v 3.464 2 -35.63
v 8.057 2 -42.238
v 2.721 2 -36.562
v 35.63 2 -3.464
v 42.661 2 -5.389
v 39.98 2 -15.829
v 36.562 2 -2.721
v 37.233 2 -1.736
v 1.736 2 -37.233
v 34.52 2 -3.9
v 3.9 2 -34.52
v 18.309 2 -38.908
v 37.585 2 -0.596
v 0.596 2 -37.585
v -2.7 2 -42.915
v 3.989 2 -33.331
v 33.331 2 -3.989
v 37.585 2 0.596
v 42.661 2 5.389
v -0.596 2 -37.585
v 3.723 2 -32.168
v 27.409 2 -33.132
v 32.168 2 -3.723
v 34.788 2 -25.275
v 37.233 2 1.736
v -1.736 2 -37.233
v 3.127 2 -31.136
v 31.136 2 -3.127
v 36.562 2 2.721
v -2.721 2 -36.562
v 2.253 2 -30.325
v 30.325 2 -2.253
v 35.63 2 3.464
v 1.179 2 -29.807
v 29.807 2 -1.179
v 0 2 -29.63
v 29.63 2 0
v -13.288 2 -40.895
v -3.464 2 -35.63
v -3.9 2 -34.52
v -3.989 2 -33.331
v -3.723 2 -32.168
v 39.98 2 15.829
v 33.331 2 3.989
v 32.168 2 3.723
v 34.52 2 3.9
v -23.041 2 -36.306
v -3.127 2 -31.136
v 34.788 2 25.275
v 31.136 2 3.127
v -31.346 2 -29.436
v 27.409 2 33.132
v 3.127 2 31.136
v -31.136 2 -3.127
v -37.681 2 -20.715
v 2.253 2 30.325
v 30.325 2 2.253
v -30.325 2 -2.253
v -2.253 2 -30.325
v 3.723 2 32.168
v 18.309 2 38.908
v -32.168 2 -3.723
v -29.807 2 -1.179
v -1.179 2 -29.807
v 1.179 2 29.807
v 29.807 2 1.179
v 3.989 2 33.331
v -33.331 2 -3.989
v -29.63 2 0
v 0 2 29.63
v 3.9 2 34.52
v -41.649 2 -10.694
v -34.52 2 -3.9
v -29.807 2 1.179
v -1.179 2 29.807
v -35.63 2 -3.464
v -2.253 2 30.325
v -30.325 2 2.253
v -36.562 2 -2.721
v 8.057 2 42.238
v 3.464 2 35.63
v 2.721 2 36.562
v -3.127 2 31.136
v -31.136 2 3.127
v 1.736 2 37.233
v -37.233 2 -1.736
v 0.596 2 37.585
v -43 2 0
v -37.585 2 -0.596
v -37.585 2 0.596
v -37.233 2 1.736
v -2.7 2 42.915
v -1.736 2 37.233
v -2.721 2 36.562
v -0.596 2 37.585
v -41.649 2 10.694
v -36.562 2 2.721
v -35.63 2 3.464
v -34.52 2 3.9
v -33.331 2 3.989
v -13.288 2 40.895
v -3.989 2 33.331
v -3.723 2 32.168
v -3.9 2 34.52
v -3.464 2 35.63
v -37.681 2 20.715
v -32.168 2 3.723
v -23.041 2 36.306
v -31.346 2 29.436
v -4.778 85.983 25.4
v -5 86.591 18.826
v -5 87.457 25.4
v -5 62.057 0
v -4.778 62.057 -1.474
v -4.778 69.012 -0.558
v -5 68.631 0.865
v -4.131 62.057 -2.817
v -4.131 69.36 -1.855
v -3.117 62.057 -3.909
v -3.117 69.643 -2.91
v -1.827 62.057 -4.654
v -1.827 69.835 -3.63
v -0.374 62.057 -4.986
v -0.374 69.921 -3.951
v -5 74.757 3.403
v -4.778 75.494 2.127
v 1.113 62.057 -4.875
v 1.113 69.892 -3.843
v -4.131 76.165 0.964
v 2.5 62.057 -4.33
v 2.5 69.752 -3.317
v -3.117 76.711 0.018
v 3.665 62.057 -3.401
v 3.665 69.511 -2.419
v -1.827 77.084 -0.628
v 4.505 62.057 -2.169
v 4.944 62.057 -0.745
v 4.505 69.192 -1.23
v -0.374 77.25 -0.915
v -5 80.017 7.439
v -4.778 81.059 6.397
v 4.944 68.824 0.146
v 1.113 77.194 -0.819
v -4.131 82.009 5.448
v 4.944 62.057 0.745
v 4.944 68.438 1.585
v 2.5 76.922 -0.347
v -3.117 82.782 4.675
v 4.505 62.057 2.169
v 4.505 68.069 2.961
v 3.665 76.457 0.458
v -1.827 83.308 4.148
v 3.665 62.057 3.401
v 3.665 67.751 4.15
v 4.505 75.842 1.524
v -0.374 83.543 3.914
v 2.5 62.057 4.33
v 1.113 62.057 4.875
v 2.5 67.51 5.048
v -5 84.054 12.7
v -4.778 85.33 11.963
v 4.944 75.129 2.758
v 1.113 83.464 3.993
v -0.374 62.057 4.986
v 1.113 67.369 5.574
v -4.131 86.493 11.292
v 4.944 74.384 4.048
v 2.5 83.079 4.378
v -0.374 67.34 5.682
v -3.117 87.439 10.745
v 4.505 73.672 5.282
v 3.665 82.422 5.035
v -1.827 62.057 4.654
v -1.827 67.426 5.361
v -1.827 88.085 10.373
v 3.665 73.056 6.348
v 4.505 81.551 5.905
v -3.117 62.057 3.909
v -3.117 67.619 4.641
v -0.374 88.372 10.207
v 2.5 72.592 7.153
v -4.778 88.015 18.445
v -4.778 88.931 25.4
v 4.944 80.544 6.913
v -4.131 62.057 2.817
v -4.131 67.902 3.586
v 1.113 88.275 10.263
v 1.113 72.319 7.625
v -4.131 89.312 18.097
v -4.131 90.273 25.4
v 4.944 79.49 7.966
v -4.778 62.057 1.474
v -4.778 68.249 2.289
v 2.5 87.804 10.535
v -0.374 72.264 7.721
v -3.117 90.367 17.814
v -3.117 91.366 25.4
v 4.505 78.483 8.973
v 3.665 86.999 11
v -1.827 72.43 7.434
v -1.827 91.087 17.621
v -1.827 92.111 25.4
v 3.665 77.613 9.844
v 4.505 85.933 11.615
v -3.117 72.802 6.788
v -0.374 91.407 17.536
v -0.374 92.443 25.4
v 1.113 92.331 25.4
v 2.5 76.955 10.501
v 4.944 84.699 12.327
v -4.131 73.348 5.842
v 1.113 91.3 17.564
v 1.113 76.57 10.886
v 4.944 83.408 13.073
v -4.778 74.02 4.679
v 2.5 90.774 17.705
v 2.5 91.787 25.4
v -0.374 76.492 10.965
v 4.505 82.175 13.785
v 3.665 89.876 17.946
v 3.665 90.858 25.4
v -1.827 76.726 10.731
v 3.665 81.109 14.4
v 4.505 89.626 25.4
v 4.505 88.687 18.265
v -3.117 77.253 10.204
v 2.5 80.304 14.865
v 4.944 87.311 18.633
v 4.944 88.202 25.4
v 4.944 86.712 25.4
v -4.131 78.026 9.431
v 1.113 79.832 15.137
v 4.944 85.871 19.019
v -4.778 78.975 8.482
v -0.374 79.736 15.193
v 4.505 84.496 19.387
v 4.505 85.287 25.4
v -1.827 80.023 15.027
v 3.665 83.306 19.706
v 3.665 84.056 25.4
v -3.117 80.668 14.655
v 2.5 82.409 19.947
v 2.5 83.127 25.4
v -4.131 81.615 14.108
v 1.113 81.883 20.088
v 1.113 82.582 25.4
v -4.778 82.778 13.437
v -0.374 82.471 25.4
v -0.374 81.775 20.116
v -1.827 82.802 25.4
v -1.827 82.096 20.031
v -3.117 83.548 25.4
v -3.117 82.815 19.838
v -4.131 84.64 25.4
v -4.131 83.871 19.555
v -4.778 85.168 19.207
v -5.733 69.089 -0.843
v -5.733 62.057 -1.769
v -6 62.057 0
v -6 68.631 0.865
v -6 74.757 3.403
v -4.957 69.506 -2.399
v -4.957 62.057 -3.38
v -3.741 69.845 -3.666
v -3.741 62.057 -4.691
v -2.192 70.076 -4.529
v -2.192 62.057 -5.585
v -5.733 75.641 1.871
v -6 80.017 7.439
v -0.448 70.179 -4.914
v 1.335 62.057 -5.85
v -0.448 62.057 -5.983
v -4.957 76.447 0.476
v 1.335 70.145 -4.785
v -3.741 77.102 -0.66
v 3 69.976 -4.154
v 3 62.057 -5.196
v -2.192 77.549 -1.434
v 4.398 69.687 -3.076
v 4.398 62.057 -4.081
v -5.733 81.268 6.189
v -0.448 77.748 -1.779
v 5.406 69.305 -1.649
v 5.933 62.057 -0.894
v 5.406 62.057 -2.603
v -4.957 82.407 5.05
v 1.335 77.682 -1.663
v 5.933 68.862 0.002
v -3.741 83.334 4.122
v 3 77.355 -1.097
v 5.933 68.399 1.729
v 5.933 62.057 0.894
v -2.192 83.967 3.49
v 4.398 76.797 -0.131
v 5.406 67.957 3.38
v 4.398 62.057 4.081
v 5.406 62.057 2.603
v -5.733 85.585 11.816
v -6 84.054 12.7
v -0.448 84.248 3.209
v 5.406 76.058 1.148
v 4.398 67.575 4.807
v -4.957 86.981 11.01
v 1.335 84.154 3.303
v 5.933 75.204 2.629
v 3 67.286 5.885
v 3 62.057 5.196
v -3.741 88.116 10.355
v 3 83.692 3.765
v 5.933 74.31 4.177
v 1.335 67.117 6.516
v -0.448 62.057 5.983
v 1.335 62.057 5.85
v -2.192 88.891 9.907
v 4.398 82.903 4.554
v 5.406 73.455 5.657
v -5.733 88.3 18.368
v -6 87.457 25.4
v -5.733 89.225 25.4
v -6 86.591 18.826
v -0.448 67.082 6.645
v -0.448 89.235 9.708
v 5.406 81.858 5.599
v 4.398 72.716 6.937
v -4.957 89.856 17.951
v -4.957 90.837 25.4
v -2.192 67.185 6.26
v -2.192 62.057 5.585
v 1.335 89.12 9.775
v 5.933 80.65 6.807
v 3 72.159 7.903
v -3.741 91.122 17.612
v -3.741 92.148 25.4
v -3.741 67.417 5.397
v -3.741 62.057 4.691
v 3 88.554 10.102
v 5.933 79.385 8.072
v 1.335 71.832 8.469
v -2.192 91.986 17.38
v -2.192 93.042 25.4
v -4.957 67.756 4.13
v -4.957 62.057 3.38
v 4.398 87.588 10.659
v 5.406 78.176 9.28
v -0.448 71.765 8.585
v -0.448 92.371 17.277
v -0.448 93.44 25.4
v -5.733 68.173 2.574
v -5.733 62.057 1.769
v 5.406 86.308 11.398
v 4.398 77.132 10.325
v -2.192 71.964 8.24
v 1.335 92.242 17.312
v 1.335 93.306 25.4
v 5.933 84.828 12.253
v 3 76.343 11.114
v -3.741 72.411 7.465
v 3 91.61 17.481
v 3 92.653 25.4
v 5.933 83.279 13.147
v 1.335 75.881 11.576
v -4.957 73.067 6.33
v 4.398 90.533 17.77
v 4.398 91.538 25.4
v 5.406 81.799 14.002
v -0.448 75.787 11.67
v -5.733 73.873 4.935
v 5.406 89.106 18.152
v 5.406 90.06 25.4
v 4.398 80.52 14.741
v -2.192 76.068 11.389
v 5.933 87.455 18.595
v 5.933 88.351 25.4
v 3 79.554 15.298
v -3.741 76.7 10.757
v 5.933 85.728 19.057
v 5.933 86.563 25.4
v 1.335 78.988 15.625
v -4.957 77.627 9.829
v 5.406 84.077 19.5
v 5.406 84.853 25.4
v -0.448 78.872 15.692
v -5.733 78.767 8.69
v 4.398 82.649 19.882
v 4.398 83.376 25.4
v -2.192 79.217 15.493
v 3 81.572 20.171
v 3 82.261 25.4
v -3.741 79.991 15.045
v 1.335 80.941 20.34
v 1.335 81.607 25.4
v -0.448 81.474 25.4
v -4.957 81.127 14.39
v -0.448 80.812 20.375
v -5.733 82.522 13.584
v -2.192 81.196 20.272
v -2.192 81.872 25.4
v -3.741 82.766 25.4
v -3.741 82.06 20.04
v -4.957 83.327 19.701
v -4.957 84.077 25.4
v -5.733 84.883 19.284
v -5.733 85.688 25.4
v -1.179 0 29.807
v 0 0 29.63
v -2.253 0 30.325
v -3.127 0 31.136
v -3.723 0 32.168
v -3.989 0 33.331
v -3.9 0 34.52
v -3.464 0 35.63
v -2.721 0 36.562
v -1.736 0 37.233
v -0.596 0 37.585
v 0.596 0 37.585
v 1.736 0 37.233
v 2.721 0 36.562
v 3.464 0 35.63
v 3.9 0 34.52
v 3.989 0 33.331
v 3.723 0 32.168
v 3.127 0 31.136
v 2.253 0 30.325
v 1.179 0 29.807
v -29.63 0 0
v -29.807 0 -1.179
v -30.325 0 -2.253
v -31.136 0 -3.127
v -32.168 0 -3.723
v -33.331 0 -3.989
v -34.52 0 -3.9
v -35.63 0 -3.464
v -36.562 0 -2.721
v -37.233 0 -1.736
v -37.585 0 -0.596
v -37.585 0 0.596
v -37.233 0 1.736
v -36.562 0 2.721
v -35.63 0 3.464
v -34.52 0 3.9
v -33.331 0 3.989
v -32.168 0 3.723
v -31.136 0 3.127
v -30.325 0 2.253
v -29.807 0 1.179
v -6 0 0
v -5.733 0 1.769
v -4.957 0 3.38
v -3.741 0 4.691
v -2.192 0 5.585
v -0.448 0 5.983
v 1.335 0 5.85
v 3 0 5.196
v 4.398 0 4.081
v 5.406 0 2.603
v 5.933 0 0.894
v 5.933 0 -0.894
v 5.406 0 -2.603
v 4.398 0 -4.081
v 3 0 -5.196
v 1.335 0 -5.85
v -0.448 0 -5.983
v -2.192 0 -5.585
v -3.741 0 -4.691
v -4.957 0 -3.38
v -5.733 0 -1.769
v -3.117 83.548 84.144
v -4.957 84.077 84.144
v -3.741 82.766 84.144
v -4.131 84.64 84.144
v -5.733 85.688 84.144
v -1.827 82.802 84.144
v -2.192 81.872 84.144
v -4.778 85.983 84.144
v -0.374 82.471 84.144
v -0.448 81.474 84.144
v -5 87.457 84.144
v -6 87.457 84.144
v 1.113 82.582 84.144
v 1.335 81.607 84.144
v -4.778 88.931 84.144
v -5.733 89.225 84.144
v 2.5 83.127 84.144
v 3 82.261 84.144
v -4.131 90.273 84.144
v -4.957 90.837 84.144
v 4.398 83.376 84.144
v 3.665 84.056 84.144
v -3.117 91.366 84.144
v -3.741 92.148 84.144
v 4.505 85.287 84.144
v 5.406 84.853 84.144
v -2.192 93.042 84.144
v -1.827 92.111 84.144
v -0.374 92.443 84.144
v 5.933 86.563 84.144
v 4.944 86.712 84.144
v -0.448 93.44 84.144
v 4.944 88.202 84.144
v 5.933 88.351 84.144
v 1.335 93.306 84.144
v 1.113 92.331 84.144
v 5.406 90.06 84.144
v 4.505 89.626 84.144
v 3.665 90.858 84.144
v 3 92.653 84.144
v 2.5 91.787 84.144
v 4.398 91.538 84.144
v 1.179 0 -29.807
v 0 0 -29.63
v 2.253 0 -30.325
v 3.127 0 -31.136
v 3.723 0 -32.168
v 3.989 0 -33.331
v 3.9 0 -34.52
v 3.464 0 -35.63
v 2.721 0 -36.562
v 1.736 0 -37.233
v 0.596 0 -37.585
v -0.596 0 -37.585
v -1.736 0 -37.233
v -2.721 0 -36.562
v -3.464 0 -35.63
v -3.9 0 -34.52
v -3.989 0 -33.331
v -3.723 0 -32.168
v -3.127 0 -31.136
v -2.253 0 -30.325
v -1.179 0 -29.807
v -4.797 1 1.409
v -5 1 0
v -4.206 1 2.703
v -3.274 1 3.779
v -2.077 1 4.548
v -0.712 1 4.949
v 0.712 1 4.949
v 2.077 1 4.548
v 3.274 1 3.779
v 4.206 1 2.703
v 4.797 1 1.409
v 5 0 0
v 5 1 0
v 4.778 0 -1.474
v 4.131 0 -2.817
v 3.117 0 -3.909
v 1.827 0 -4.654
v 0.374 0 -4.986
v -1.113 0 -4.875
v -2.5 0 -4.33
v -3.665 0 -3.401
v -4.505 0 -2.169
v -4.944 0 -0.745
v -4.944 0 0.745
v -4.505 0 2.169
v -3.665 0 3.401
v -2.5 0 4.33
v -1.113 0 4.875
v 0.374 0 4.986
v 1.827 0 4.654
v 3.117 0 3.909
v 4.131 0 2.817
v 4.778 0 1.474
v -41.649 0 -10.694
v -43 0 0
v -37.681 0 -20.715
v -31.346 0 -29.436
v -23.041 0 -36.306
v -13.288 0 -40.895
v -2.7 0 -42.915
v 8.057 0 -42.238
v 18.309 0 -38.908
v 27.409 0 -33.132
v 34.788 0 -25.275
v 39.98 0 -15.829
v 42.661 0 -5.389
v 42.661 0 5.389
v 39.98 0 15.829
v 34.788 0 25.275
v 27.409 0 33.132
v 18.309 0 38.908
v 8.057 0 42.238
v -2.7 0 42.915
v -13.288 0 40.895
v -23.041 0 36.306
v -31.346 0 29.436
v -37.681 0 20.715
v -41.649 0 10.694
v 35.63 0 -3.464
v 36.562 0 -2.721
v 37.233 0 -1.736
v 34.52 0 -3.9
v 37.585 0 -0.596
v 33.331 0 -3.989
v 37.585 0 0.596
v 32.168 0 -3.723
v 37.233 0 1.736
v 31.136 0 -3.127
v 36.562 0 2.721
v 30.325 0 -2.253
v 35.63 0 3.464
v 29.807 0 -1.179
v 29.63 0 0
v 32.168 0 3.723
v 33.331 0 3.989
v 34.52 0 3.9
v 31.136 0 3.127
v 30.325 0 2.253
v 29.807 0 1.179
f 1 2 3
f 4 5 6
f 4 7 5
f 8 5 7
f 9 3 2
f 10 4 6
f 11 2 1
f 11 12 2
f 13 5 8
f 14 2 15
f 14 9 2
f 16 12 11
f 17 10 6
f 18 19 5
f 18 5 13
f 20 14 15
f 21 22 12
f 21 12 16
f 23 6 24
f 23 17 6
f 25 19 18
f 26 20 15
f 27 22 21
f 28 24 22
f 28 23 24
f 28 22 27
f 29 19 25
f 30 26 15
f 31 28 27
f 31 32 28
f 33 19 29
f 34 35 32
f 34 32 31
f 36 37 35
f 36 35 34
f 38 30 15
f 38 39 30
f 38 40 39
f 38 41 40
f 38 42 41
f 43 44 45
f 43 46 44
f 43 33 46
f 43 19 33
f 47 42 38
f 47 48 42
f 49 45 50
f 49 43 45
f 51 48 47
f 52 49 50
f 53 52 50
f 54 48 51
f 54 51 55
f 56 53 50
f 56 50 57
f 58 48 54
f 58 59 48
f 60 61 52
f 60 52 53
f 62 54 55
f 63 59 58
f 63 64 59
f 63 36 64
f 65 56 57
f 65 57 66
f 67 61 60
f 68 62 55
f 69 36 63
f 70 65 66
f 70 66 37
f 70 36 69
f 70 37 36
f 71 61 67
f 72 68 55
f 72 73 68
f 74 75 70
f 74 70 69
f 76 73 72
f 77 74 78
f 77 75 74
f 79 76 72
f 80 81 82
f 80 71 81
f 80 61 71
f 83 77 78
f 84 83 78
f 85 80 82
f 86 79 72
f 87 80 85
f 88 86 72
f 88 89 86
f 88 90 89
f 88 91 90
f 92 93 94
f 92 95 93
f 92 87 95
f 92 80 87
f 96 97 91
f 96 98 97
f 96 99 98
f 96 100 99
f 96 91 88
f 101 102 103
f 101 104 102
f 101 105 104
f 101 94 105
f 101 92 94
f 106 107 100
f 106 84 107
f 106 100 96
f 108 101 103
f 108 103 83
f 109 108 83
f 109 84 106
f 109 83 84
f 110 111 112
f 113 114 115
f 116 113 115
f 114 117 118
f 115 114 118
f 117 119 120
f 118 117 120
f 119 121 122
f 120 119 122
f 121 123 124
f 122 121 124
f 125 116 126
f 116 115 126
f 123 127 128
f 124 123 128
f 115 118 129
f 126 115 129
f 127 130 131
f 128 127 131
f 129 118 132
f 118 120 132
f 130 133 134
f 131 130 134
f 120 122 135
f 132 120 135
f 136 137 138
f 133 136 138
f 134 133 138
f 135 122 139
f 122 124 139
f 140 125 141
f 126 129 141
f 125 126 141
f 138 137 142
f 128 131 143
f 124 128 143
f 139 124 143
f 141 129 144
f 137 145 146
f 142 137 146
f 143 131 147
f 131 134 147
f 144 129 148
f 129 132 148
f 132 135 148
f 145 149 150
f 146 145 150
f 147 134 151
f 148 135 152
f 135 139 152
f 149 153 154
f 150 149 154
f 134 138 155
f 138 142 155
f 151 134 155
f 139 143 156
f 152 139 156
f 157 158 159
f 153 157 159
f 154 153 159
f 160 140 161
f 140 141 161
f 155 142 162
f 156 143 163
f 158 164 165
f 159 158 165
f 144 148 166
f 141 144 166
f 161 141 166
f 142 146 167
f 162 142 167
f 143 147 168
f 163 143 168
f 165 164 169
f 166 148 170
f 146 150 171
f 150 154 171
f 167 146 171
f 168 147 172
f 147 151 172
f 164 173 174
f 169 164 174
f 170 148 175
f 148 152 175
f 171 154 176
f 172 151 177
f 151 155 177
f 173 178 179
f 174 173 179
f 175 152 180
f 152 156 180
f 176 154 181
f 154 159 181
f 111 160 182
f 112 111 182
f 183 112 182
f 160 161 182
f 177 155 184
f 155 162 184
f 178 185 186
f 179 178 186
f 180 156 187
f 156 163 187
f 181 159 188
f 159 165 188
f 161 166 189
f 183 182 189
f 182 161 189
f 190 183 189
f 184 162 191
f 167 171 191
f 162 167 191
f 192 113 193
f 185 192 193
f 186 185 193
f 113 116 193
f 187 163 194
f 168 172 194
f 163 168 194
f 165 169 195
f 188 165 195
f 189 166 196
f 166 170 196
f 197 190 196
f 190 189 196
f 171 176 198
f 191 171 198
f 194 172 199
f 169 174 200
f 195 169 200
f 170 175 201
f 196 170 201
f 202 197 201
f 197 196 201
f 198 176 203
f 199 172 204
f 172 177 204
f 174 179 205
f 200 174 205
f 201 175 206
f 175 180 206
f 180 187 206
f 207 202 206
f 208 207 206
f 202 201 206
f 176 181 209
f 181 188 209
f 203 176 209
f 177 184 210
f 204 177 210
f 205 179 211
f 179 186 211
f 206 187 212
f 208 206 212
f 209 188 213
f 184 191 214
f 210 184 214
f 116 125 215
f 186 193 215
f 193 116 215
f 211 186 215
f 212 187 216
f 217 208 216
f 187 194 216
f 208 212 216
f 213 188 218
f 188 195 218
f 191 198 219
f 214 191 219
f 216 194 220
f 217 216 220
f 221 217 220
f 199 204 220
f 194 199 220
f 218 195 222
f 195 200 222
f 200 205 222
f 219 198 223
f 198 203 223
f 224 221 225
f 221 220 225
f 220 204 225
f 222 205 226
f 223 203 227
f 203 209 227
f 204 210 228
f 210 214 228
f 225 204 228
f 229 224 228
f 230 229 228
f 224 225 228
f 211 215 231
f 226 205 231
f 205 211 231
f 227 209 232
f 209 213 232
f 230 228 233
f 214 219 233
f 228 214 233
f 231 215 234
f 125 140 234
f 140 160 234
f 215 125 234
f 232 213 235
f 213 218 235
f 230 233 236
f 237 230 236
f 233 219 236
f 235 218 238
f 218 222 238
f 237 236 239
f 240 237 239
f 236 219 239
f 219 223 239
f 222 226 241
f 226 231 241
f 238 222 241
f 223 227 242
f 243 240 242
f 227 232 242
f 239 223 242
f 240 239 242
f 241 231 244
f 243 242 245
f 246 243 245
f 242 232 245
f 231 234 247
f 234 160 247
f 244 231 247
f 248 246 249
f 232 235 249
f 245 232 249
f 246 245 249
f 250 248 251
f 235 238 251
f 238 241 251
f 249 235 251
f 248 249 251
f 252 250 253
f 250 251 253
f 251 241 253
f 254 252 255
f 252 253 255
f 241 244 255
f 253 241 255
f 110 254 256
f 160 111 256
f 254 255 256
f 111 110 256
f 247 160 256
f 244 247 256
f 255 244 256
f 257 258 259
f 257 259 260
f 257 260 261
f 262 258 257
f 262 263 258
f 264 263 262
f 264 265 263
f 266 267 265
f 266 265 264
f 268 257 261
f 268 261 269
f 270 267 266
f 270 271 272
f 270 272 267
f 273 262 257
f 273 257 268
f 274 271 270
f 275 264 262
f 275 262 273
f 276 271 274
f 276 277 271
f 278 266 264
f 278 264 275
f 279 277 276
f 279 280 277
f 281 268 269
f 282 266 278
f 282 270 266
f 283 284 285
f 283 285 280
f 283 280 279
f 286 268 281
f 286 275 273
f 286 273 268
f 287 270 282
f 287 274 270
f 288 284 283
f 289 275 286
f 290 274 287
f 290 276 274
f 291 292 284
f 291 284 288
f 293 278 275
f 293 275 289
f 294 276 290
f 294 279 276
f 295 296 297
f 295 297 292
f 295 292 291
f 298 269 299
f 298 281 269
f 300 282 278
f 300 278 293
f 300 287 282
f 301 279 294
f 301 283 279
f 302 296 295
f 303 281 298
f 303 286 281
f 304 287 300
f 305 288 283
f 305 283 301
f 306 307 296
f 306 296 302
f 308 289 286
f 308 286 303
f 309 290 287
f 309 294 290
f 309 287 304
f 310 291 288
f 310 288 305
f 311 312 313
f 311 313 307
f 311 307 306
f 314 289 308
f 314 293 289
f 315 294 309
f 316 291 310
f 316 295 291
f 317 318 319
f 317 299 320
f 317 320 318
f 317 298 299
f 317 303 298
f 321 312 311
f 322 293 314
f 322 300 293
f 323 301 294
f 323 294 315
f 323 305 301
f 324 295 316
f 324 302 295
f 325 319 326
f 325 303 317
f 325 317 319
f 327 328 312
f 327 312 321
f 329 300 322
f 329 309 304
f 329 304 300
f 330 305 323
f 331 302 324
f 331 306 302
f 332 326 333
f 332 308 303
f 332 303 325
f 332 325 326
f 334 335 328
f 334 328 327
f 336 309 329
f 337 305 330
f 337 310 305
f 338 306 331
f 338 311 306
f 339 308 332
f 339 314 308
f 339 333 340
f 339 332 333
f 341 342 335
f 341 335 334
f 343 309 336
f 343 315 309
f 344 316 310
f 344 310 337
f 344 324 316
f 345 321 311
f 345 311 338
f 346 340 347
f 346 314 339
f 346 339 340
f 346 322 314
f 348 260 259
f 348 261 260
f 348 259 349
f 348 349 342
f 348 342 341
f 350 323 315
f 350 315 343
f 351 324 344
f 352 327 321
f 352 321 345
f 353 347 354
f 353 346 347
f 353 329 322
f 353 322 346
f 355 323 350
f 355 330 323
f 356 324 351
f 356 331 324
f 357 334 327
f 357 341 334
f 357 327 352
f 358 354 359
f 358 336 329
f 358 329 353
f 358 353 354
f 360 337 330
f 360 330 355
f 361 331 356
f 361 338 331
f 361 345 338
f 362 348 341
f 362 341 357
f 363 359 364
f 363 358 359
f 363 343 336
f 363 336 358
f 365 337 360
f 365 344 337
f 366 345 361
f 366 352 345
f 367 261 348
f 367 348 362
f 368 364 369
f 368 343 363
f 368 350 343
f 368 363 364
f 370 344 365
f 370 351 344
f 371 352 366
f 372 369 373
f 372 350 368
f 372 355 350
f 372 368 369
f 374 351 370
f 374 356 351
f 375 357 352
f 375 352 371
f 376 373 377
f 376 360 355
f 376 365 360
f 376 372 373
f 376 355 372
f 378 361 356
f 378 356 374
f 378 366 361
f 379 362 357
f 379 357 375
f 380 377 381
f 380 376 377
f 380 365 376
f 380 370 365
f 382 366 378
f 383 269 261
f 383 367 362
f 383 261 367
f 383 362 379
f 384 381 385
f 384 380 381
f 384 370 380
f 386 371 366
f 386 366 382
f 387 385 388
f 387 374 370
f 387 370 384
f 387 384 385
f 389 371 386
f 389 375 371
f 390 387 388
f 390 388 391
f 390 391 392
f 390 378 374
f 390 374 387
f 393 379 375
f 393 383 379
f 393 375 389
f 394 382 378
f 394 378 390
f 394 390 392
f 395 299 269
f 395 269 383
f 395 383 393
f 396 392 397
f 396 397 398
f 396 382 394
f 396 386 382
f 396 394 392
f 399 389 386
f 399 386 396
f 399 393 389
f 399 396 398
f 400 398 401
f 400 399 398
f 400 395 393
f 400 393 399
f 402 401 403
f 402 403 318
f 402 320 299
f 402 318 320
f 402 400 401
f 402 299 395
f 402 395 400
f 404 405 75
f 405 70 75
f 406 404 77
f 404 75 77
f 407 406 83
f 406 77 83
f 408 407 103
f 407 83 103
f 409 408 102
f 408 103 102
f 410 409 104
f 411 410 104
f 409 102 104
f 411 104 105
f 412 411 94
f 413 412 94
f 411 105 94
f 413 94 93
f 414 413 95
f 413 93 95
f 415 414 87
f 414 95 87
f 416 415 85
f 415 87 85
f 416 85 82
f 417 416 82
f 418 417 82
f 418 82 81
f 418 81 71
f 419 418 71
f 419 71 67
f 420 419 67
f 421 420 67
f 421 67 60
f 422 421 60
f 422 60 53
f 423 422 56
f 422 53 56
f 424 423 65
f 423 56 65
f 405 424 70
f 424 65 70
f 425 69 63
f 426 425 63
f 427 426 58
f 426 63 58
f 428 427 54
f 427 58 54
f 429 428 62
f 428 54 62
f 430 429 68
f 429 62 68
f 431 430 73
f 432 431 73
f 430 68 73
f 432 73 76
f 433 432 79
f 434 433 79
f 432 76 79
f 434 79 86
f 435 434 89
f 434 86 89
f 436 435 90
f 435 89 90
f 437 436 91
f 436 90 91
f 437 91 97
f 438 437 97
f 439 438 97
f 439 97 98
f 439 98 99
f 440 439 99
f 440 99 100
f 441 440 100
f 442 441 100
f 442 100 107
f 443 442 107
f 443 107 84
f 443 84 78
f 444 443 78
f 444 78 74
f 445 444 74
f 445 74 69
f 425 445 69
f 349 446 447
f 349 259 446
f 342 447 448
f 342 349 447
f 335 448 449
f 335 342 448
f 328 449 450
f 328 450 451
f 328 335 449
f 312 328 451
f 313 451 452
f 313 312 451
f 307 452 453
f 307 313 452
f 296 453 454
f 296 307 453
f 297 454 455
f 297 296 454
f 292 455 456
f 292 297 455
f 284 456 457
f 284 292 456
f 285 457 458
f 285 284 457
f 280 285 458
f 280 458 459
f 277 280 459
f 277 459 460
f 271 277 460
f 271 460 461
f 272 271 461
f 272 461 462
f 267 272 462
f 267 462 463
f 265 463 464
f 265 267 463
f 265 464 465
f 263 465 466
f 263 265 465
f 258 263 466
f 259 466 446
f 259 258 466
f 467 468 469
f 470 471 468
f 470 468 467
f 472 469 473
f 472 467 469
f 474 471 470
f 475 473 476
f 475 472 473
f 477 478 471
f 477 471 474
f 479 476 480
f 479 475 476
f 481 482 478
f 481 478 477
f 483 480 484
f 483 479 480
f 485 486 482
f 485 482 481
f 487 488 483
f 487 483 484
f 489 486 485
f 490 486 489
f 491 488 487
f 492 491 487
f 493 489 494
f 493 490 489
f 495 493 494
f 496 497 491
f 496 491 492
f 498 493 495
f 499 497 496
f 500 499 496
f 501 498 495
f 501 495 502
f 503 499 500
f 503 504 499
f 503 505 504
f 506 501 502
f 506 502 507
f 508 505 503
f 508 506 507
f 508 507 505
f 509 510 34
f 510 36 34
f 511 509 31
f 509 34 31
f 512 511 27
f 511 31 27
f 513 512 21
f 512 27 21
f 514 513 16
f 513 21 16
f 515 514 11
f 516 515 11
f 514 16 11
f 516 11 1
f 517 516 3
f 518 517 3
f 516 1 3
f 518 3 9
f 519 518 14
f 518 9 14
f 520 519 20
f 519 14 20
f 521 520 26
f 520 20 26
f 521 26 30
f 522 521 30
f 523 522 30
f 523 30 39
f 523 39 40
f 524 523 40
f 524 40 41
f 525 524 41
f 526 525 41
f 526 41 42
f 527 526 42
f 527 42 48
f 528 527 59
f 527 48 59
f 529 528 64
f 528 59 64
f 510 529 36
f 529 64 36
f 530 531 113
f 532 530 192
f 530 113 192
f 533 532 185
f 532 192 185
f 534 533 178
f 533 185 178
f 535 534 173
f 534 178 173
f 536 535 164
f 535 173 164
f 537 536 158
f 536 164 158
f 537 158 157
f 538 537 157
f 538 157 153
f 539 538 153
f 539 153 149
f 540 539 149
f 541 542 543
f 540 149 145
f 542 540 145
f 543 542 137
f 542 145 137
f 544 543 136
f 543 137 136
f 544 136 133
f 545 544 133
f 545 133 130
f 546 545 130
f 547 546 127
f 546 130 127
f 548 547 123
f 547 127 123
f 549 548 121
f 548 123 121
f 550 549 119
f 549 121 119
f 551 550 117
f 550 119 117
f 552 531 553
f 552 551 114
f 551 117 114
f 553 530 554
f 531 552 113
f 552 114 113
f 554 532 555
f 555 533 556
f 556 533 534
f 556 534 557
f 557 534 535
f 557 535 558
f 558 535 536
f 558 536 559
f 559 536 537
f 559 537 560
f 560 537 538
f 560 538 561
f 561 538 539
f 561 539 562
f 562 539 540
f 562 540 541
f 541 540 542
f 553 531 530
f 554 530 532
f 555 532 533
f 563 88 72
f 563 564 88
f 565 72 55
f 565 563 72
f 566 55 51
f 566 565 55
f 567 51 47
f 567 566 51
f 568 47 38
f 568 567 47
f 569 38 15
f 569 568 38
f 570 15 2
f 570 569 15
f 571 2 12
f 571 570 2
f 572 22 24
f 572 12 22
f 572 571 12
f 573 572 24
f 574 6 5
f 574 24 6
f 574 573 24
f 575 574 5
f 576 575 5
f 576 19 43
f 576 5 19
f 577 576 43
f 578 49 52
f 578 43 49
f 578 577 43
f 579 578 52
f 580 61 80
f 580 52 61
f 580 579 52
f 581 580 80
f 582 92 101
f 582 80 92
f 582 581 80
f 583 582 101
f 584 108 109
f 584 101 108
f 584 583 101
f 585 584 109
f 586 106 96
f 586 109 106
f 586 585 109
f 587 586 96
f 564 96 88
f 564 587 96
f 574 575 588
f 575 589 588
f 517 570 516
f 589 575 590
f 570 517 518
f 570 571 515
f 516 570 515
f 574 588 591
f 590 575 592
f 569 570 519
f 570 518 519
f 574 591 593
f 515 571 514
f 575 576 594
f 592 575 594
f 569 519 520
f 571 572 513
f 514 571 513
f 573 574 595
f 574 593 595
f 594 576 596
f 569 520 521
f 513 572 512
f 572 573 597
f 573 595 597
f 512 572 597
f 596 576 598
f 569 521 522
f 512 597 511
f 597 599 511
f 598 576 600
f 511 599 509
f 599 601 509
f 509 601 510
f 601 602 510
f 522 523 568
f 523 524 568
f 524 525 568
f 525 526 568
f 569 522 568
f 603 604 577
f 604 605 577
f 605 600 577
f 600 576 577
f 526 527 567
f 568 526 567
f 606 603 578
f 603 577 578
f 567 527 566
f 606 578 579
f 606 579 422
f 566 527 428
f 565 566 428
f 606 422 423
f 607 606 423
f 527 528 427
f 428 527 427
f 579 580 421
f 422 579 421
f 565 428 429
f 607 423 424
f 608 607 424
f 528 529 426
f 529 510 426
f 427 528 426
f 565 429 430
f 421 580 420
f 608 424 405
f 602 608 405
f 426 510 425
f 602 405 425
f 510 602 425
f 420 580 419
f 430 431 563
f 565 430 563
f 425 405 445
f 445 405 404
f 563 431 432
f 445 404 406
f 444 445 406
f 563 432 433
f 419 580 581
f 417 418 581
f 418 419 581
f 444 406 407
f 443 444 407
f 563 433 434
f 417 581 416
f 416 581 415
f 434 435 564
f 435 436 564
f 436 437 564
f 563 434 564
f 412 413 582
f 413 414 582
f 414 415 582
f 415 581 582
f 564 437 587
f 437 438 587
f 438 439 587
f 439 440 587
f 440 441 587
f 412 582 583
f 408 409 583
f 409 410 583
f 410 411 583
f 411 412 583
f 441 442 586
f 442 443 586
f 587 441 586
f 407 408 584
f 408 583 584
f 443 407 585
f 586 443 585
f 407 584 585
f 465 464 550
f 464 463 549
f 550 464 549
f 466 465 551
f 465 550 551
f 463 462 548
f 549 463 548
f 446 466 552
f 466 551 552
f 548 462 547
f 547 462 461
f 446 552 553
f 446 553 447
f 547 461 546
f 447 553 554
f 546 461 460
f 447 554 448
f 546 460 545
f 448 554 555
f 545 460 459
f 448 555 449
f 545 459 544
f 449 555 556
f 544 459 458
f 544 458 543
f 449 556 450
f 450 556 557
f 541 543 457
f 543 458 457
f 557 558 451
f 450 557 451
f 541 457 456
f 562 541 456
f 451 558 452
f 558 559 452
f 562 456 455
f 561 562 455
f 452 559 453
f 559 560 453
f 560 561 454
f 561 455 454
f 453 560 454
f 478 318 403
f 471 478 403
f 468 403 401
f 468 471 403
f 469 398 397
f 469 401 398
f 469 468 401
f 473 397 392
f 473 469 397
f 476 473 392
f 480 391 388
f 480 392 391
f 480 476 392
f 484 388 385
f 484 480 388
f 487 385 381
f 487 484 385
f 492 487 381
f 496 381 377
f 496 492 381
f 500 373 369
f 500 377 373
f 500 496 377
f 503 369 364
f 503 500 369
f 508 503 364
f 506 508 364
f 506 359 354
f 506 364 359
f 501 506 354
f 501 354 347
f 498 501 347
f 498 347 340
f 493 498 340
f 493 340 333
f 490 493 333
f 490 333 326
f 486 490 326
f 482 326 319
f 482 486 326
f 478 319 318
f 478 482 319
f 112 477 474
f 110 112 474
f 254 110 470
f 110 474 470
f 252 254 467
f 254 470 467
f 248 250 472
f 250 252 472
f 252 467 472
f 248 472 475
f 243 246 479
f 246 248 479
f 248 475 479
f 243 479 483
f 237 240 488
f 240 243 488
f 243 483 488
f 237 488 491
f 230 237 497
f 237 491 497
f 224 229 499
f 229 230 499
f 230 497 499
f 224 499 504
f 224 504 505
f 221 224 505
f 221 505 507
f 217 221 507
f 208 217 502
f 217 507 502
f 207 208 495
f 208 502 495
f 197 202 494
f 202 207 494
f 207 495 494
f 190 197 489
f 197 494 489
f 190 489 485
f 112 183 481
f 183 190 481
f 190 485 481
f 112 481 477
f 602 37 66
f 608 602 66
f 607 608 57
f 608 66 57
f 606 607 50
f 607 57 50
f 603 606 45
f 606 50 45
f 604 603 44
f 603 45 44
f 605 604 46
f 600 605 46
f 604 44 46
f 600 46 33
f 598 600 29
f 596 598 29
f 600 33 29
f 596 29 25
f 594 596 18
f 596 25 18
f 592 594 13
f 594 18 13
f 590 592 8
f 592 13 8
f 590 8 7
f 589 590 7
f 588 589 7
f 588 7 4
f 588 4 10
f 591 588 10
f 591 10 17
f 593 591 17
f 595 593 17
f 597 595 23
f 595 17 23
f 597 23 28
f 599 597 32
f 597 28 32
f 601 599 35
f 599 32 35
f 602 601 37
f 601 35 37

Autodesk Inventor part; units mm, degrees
ref_plane "YZ Plane" through (0, 0, 0) normal (1, 0, 0) x (0, 1, 0)
ref_plane "XZ Plane" through (0, 0, 0) normal (0, 1, 0) x (-1, 0, 0)
sketch "Sketch1" plane through (0, 0, 0) normal (0, 1, 0) x (-1, 0, 0)
  circle A0 centre (0, 0) radius 43
  dimension "d0" = 86
extrude "Extrusion1" add sketch "Sketch1" along normal blind 2
sketch "Sketch2" plane through (0, 2, 0) normal (0, 1, 0) x (1, 0, 0)
  circle A0 centre (-33.6296, 0) radius 4
  point P0 (0, 0)
  dimension "d3" = 8
  dimension "d4" = 33.6296
extrude "Extrusion2" cut sketch "Sketch2" against normal blind 2
pattern_circular "Circular Pattern1" count 4 over 360 about axis through (0, 0, 0) along (0, 1, 0) of "Extrusion2"
sketch "Sketch3" plane through (0, 2, 0) normal (0, 1, 0) x (1, 0, 0)
  point P0 (0, 0)
sketch "Sketch4" plane through (0, 0, 0) normal (1, 0, 0) x (0, 1, 0)
  line L0 (0, 0) -> (62.0568, 0)
  line L1 (87.4568, 84.1442) -> (87.4568, 25.4)
  arc A0 (62.0568, 0) -> (87.4568, 25.4) centre (62.0568, 25.4) ccw
  point P0 (87.4568, 0)
  dimension "d18" = 25.4
ref_plane "Work Plane1" through (0, 2, 0) normal (0, 1, 0) x (-1, 0, 0)
sketch "Sketch5" plane through (0, 2, 0) normal (0, 1, 0) x (-1, 0, 0)
  circle A0 centre (0, 0) radius 5
  circle A1 centre (0, 0) radius 6
  dimension "d11" = 10
  dimension "d12" = 1
sweep "Sweep1" add profiles "Sketch5" path "Sketch4" separate body contours A0 | A1
shell "Shell1" thickness 1 removed faces 1 at (0.2643, 86.4344, 84.1442) bodies 2
sketch "Sketch6" plane through (0, 0, 0) normal (0, -1, 0) x (1, 0, 0)
  circle A0 centre (0, 0) radius 6 projected
  circle A1 centre (0, 0) radius 5
extrude "Extrusion3" cut sketch "Sketch6" against normal blind 41.275 contours A1 bodies 2
properties part number "fractionating_column_cover"
